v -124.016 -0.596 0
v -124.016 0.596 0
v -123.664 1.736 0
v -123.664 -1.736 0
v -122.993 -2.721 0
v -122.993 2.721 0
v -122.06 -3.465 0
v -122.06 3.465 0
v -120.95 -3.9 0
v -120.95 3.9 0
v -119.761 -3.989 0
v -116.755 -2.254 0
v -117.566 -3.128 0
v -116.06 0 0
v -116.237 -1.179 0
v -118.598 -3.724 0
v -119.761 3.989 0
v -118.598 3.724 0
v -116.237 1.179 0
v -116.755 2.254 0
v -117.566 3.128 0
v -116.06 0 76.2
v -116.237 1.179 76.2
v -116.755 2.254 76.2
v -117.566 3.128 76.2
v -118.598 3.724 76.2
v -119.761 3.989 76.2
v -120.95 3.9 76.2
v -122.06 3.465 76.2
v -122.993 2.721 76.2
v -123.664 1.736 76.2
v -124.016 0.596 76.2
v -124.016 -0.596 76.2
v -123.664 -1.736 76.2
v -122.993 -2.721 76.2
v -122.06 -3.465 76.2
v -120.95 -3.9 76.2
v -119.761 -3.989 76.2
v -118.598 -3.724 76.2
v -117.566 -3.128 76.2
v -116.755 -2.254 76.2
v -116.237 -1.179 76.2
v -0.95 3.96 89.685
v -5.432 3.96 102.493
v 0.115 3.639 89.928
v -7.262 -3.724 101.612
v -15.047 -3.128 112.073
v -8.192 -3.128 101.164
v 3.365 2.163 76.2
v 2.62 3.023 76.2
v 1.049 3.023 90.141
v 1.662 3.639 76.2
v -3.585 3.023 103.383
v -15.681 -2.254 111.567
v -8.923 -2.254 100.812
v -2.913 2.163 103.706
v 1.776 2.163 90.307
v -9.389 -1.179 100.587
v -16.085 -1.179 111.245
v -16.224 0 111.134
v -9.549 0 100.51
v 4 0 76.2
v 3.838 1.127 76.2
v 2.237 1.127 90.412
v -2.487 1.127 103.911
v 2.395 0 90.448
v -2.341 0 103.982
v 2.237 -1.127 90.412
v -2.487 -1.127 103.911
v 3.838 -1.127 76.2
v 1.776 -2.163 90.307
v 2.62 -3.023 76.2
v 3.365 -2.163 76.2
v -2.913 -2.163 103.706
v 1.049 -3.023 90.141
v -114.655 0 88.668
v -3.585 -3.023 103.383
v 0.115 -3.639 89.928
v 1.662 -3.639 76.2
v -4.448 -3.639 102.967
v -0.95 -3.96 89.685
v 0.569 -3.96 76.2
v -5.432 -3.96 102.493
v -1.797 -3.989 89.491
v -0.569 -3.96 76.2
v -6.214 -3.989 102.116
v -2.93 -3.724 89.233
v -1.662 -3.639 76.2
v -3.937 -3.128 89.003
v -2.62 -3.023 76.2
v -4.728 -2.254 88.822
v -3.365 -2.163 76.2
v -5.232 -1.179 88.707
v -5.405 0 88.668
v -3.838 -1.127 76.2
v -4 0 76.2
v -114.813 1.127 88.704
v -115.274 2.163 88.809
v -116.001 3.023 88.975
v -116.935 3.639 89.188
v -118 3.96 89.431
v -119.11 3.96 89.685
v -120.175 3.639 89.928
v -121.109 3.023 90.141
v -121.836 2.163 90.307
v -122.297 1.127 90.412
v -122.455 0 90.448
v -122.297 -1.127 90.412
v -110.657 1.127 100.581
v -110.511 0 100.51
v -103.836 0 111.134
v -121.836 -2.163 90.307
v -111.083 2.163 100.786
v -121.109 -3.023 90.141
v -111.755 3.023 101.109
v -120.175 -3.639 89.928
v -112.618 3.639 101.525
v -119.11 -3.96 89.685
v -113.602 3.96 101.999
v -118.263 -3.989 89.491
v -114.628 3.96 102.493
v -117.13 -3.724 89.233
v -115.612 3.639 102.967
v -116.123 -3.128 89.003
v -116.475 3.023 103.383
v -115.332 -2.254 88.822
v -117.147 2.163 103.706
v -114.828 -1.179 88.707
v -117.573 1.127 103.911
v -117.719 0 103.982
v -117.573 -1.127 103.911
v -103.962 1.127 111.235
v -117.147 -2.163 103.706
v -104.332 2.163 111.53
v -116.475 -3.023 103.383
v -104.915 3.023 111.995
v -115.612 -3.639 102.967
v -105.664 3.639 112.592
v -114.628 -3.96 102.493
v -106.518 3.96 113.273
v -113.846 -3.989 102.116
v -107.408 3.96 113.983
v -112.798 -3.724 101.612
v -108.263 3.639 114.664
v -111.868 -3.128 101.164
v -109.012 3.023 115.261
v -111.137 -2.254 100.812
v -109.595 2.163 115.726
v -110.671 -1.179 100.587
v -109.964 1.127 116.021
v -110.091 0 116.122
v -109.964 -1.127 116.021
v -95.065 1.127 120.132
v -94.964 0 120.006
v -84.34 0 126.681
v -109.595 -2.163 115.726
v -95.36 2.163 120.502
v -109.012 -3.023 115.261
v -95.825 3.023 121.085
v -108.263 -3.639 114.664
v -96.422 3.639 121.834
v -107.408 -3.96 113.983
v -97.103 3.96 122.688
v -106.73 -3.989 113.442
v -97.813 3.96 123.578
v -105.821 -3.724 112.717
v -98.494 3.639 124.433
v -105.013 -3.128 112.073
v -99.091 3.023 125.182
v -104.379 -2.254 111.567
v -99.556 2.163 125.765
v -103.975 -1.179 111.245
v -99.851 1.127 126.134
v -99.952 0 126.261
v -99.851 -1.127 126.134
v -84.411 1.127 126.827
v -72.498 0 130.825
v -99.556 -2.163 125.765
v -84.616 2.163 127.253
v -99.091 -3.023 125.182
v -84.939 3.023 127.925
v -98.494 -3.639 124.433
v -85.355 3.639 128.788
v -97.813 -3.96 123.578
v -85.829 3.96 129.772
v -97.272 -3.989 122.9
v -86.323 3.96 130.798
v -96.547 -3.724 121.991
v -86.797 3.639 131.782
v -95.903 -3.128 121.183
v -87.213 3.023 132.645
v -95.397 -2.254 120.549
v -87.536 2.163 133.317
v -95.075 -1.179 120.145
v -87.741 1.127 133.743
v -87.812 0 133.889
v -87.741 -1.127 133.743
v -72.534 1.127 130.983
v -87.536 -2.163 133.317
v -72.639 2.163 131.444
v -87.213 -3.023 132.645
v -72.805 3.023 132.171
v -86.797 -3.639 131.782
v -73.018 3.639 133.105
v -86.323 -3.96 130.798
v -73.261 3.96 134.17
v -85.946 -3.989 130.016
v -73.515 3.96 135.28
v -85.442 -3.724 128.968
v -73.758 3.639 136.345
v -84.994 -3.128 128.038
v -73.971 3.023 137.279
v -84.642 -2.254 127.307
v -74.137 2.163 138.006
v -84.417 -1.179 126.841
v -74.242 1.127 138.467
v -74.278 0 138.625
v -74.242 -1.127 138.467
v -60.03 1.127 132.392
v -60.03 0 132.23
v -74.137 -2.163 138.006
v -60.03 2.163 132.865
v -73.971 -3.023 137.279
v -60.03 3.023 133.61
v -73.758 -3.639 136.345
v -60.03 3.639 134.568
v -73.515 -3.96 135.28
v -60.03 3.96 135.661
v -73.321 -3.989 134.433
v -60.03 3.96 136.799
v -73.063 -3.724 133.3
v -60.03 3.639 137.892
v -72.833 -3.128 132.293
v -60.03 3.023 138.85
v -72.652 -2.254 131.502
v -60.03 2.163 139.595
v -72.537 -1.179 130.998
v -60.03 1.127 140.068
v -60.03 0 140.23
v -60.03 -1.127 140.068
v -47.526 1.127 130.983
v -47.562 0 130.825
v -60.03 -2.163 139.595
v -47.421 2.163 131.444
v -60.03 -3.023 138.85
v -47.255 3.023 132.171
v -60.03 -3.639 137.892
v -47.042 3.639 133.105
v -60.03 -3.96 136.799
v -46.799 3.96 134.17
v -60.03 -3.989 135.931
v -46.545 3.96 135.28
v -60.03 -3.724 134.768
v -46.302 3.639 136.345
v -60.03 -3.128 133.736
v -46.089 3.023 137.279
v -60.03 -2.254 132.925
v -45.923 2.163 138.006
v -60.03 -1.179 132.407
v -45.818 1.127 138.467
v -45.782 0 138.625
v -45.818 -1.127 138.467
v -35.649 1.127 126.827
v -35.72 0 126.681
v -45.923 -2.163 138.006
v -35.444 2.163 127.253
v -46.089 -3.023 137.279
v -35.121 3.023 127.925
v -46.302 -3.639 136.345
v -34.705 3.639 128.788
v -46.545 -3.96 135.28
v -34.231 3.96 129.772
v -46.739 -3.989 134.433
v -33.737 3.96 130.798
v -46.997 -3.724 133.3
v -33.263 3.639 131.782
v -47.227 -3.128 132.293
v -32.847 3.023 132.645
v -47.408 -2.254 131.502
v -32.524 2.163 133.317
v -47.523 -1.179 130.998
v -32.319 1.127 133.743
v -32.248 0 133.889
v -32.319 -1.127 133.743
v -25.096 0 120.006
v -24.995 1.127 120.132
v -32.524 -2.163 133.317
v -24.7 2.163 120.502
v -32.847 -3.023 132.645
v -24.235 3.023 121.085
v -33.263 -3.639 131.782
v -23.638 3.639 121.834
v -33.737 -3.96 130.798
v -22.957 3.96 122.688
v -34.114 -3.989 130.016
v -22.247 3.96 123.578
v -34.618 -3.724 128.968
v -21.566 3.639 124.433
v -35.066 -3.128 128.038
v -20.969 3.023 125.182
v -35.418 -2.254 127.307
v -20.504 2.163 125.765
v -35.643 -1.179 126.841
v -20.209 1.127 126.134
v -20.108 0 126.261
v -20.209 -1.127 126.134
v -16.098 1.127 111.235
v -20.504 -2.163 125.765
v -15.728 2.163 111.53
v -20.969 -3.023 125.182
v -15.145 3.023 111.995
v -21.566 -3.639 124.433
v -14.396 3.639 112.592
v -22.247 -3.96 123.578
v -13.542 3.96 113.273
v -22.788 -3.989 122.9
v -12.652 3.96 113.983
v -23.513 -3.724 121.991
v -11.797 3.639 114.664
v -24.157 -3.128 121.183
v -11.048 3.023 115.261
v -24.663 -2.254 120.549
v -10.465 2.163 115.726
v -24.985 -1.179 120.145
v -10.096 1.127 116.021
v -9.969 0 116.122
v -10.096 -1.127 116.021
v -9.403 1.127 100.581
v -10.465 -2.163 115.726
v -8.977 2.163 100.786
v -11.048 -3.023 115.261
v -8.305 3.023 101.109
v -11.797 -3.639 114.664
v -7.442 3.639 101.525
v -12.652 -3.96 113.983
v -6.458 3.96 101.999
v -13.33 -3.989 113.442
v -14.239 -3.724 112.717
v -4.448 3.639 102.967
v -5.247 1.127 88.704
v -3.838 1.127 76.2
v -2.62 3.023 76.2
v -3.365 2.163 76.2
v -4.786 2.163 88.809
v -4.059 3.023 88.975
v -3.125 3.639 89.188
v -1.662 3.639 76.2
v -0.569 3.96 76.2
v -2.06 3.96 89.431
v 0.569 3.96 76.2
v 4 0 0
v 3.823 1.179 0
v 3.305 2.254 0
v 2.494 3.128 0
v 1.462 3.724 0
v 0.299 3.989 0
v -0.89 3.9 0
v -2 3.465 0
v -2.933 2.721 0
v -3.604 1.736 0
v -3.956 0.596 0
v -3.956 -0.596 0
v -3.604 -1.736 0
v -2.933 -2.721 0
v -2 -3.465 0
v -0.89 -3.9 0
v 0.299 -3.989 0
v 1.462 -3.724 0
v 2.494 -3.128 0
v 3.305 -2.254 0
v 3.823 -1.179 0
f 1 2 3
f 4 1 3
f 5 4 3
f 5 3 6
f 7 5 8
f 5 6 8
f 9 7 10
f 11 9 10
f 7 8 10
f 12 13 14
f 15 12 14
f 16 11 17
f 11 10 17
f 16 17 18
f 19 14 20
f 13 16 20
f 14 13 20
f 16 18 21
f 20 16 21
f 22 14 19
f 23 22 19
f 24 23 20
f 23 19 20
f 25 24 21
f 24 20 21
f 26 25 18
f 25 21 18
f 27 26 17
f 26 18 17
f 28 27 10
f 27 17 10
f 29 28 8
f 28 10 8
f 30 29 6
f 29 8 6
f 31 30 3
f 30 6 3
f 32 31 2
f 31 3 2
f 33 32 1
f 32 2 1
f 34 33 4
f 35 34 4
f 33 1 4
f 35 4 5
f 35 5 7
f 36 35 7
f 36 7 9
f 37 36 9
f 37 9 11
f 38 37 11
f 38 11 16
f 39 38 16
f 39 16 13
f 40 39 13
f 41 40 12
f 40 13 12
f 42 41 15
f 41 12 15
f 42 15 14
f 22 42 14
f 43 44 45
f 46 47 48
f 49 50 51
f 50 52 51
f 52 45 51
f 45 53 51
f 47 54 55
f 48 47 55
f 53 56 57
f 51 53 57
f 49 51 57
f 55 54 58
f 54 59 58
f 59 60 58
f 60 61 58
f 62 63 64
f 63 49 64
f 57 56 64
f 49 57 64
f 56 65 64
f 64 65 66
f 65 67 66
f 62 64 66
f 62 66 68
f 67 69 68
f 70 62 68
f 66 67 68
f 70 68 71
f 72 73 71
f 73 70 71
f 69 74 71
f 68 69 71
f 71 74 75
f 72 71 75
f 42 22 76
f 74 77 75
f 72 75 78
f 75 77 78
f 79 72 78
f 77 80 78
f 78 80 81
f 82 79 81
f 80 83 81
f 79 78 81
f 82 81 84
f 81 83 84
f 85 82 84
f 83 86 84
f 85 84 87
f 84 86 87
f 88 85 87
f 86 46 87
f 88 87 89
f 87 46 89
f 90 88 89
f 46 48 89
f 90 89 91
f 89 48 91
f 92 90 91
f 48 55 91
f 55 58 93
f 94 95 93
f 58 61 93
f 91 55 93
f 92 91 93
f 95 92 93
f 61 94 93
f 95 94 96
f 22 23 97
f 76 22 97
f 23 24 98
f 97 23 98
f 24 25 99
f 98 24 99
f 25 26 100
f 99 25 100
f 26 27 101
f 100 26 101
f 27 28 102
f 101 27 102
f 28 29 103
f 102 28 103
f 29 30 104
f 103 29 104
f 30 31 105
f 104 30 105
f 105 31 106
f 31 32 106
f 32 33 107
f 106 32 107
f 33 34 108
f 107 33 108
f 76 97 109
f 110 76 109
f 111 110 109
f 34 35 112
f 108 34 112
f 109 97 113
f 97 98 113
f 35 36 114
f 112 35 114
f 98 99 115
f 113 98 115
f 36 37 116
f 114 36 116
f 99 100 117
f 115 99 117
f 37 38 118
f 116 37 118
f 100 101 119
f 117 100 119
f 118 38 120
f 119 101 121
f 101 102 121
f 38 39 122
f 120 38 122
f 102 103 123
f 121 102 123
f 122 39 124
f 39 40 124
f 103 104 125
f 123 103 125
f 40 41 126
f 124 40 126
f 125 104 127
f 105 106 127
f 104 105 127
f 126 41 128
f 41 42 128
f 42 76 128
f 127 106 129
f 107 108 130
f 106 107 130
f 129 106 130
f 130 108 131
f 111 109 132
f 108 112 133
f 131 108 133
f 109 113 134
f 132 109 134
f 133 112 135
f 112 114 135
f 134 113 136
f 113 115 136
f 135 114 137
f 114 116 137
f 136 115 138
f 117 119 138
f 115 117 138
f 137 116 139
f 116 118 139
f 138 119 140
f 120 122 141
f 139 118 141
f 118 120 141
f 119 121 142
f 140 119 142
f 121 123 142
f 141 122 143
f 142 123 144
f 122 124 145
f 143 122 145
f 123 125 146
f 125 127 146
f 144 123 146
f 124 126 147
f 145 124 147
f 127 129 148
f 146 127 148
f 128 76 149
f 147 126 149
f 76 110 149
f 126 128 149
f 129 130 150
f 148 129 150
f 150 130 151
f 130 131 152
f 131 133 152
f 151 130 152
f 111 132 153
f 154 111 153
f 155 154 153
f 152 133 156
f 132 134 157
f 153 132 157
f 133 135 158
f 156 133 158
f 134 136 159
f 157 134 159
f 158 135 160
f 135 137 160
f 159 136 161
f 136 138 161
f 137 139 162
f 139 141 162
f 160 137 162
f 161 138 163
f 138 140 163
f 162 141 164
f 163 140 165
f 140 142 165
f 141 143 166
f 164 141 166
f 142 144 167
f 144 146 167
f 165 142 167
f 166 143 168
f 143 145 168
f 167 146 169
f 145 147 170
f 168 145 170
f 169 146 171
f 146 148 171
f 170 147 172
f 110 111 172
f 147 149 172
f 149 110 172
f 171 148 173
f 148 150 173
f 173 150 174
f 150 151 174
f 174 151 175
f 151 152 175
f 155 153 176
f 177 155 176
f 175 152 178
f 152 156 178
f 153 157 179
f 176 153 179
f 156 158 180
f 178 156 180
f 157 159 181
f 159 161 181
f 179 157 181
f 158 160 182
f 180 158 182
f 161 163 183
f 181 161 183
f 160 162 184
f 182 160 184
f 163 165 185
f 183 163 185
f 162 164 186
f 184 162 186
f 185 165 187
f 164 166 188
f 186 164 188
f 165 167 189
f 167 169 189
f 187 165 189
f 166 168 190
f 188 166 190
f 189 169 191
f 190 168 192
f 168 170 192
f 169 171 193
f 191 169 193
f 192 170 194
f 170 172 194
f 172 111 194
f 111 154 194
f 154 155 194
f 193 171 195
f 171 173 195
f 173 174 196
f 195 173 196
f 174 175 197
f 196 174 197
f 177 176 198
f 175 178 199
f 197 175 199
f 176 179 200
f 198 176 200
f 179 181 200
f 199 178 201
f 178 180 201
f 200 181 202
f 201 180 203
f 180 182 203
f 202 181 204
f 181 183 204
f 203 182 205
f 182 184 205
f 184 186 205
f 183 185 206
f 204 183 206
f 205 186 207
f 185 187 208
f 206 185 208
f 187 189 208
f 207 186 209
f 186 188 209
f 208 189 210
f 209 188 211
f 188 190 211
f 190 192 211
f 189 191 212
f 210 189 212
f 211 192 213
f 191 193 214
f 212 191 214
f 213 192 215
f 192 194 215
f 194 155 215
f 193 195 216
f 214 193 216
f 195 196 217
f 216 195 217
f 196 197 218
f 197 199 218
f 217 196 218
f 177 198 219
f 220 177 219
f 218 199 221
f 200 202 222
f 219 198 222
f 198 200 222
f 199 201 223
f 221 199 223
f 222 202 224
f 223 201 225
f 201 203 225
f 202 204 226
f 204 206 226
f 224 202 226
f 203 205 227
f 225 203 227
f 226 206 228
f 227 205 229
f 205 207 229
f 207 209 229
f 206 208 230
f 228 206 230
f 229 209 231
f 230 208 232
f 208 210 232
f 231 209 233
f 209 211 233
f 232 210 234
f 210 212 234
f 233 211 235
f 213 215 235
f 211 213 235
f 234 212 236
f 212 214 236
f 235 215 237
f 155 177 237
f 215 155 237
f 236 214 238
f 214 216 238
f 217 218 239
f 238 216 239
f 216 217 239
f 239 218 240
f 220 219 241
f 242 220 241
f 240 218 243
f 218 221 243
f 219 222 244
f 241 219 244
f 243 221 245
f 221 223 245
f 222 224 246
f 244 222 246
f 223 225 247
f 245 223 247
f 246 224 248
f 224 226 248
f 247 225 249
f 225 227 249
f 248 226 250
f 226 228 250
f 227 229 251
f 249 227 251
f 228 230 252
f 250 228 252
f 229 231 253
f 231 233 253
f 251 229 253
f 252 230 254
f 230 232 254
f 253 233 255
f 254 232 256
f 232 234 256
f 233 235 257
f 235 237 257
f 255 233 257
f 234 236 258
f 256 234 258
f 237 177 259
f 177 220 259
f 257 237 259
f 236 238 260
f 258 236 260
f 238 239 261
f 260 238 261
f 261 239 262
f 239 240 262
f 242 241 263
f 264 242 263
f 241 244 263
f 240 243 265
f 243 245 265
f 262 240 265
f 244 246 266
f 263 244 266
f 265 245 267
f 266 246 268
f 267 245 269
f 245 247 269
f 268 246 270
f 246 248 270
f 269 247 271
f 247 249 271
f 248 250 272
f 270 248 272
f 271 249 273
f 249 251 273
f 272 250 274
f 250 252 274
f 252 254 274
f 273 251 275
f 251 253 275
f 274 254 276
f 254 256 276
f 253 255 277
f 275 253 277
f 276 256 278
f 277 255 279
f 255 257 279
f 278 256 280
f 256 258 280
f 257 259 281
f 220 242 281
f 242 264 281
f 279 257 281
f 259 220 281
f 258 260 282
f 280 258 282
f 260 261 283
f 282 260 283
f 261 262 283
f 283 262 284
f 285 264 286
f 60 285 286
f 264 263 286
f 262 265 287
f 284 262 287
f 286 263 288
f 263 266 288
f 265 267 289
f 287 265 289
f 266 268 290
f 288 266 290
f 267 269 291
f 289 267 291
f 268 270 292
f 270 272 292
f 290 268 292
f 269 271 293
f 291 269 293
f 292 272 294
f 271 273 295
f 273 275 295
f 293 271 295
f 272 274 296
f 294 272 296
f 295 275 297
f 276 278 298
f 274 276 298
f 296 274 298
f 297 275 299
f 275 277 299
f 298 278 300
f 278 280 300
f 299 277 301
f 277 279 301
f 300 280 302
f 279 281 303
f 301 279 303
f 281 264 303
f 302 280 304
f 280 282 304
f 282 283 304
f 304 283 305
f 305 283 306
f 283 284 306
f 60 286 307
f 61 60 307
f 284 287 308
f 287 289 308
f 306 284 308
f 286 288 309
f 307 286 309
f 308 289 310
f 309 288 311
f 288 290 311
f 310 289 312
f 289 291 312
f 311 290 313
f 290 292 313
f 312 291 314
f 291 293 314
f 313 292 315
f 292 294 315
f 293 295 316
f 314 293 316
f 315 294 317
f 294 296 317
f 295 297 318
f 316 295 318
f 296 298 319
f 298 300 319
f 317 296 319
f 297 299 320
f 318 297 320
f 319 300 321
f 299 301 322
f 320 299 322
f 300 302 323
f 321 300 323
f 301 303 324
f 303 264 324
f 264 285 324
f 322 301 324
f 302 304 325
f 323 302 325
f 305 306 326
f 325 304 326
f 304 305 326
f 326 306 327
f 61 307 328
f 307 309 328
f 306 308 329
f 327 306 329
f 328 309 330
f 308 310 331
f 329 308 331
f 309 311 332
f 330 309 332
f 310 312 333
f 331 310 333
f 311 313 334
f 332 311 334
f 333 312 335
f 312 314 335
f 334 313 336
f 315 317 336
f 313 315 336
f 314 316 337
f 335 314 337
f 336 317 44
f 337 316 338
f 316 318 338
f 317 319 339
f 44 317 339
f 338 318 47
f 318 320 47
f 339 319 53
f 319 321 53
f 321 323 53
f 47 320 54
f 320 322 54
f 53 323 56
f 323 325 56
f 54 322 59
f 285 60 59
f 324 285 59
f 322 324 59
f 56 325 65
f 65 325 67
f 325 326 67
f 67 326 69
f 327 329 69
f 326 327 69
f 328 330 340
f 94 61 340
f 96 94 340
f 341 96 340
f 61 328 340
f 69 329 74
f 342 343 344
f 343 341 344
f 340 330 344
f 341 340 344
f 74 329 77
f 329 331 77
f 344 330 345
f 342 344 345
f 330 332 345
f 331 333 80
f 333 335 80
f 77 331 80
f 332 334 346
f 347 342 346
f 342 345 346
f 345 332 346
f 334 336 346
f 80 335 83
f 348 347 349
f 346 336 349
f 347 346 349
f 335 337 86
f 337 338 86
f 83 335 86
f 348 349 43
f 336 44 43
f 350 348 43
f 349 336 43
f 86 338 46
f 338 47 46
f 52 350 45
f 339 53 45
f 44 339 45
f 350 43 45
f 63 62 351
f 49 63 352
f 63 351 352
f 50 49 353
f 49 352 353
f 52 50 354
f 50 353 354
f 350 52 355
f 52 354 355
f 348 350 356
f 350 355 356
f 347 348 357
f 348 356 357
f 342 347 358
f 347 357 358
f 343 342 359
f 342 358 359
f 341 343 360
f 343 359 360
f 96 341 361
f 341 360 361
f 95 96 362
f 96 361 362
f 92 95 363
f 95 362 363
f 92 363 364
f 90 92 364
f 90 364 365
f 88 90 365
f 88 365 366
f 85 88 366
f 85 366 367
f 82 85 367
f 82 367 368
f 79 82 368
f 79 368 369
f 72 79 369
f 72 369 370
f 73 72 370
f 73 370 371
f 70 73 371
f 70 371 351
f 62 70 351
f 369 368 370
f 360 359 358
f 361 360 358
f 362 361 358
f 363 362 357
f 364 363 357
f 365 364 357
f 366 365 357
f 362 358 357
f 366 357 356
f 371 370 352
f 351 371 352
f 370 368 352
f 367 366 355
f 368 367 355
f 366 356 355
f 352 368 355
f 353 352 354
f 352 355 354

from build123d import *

# Parameters (mm, degrees)
F0_R     = 4.0005
F1_DEPTH = 76.2
F2_R     = 4.0005
F3_ANGLE = 180


with BuildPart() as f1:
    # F0 (on Top) → F1 (new body)
    with BuildSketch(Plane.XY):
        Circle(F0_R)
    extrude(amount=F1_DEPTH)



with BuildPart() as f1b:
    # F0 (on Top) → F1, piece 2 (new body)
    with BuildSketch(Plane.XY):
        with Locations((-120.06, 0)):
            Circle(F0_R)
    extrude(amount=F1_DEPTH)


with BuildPart() as f1_1:
    add(f1.part)

    add(f1b.part)  # F3 merges F1b
    # F2 (on face) → F3 (revolve)
    with BuildSketch(Plane.XY.offset(76.2)):
        with Locations((-120.06, 0)):
            Circle(F2_R)
    revolve(axis=Axis((-60.03, -12.1569465846, 76.2), (0, 1, 0)), revolution_arc=F3_ANGLE)


solid = f1_1.part
